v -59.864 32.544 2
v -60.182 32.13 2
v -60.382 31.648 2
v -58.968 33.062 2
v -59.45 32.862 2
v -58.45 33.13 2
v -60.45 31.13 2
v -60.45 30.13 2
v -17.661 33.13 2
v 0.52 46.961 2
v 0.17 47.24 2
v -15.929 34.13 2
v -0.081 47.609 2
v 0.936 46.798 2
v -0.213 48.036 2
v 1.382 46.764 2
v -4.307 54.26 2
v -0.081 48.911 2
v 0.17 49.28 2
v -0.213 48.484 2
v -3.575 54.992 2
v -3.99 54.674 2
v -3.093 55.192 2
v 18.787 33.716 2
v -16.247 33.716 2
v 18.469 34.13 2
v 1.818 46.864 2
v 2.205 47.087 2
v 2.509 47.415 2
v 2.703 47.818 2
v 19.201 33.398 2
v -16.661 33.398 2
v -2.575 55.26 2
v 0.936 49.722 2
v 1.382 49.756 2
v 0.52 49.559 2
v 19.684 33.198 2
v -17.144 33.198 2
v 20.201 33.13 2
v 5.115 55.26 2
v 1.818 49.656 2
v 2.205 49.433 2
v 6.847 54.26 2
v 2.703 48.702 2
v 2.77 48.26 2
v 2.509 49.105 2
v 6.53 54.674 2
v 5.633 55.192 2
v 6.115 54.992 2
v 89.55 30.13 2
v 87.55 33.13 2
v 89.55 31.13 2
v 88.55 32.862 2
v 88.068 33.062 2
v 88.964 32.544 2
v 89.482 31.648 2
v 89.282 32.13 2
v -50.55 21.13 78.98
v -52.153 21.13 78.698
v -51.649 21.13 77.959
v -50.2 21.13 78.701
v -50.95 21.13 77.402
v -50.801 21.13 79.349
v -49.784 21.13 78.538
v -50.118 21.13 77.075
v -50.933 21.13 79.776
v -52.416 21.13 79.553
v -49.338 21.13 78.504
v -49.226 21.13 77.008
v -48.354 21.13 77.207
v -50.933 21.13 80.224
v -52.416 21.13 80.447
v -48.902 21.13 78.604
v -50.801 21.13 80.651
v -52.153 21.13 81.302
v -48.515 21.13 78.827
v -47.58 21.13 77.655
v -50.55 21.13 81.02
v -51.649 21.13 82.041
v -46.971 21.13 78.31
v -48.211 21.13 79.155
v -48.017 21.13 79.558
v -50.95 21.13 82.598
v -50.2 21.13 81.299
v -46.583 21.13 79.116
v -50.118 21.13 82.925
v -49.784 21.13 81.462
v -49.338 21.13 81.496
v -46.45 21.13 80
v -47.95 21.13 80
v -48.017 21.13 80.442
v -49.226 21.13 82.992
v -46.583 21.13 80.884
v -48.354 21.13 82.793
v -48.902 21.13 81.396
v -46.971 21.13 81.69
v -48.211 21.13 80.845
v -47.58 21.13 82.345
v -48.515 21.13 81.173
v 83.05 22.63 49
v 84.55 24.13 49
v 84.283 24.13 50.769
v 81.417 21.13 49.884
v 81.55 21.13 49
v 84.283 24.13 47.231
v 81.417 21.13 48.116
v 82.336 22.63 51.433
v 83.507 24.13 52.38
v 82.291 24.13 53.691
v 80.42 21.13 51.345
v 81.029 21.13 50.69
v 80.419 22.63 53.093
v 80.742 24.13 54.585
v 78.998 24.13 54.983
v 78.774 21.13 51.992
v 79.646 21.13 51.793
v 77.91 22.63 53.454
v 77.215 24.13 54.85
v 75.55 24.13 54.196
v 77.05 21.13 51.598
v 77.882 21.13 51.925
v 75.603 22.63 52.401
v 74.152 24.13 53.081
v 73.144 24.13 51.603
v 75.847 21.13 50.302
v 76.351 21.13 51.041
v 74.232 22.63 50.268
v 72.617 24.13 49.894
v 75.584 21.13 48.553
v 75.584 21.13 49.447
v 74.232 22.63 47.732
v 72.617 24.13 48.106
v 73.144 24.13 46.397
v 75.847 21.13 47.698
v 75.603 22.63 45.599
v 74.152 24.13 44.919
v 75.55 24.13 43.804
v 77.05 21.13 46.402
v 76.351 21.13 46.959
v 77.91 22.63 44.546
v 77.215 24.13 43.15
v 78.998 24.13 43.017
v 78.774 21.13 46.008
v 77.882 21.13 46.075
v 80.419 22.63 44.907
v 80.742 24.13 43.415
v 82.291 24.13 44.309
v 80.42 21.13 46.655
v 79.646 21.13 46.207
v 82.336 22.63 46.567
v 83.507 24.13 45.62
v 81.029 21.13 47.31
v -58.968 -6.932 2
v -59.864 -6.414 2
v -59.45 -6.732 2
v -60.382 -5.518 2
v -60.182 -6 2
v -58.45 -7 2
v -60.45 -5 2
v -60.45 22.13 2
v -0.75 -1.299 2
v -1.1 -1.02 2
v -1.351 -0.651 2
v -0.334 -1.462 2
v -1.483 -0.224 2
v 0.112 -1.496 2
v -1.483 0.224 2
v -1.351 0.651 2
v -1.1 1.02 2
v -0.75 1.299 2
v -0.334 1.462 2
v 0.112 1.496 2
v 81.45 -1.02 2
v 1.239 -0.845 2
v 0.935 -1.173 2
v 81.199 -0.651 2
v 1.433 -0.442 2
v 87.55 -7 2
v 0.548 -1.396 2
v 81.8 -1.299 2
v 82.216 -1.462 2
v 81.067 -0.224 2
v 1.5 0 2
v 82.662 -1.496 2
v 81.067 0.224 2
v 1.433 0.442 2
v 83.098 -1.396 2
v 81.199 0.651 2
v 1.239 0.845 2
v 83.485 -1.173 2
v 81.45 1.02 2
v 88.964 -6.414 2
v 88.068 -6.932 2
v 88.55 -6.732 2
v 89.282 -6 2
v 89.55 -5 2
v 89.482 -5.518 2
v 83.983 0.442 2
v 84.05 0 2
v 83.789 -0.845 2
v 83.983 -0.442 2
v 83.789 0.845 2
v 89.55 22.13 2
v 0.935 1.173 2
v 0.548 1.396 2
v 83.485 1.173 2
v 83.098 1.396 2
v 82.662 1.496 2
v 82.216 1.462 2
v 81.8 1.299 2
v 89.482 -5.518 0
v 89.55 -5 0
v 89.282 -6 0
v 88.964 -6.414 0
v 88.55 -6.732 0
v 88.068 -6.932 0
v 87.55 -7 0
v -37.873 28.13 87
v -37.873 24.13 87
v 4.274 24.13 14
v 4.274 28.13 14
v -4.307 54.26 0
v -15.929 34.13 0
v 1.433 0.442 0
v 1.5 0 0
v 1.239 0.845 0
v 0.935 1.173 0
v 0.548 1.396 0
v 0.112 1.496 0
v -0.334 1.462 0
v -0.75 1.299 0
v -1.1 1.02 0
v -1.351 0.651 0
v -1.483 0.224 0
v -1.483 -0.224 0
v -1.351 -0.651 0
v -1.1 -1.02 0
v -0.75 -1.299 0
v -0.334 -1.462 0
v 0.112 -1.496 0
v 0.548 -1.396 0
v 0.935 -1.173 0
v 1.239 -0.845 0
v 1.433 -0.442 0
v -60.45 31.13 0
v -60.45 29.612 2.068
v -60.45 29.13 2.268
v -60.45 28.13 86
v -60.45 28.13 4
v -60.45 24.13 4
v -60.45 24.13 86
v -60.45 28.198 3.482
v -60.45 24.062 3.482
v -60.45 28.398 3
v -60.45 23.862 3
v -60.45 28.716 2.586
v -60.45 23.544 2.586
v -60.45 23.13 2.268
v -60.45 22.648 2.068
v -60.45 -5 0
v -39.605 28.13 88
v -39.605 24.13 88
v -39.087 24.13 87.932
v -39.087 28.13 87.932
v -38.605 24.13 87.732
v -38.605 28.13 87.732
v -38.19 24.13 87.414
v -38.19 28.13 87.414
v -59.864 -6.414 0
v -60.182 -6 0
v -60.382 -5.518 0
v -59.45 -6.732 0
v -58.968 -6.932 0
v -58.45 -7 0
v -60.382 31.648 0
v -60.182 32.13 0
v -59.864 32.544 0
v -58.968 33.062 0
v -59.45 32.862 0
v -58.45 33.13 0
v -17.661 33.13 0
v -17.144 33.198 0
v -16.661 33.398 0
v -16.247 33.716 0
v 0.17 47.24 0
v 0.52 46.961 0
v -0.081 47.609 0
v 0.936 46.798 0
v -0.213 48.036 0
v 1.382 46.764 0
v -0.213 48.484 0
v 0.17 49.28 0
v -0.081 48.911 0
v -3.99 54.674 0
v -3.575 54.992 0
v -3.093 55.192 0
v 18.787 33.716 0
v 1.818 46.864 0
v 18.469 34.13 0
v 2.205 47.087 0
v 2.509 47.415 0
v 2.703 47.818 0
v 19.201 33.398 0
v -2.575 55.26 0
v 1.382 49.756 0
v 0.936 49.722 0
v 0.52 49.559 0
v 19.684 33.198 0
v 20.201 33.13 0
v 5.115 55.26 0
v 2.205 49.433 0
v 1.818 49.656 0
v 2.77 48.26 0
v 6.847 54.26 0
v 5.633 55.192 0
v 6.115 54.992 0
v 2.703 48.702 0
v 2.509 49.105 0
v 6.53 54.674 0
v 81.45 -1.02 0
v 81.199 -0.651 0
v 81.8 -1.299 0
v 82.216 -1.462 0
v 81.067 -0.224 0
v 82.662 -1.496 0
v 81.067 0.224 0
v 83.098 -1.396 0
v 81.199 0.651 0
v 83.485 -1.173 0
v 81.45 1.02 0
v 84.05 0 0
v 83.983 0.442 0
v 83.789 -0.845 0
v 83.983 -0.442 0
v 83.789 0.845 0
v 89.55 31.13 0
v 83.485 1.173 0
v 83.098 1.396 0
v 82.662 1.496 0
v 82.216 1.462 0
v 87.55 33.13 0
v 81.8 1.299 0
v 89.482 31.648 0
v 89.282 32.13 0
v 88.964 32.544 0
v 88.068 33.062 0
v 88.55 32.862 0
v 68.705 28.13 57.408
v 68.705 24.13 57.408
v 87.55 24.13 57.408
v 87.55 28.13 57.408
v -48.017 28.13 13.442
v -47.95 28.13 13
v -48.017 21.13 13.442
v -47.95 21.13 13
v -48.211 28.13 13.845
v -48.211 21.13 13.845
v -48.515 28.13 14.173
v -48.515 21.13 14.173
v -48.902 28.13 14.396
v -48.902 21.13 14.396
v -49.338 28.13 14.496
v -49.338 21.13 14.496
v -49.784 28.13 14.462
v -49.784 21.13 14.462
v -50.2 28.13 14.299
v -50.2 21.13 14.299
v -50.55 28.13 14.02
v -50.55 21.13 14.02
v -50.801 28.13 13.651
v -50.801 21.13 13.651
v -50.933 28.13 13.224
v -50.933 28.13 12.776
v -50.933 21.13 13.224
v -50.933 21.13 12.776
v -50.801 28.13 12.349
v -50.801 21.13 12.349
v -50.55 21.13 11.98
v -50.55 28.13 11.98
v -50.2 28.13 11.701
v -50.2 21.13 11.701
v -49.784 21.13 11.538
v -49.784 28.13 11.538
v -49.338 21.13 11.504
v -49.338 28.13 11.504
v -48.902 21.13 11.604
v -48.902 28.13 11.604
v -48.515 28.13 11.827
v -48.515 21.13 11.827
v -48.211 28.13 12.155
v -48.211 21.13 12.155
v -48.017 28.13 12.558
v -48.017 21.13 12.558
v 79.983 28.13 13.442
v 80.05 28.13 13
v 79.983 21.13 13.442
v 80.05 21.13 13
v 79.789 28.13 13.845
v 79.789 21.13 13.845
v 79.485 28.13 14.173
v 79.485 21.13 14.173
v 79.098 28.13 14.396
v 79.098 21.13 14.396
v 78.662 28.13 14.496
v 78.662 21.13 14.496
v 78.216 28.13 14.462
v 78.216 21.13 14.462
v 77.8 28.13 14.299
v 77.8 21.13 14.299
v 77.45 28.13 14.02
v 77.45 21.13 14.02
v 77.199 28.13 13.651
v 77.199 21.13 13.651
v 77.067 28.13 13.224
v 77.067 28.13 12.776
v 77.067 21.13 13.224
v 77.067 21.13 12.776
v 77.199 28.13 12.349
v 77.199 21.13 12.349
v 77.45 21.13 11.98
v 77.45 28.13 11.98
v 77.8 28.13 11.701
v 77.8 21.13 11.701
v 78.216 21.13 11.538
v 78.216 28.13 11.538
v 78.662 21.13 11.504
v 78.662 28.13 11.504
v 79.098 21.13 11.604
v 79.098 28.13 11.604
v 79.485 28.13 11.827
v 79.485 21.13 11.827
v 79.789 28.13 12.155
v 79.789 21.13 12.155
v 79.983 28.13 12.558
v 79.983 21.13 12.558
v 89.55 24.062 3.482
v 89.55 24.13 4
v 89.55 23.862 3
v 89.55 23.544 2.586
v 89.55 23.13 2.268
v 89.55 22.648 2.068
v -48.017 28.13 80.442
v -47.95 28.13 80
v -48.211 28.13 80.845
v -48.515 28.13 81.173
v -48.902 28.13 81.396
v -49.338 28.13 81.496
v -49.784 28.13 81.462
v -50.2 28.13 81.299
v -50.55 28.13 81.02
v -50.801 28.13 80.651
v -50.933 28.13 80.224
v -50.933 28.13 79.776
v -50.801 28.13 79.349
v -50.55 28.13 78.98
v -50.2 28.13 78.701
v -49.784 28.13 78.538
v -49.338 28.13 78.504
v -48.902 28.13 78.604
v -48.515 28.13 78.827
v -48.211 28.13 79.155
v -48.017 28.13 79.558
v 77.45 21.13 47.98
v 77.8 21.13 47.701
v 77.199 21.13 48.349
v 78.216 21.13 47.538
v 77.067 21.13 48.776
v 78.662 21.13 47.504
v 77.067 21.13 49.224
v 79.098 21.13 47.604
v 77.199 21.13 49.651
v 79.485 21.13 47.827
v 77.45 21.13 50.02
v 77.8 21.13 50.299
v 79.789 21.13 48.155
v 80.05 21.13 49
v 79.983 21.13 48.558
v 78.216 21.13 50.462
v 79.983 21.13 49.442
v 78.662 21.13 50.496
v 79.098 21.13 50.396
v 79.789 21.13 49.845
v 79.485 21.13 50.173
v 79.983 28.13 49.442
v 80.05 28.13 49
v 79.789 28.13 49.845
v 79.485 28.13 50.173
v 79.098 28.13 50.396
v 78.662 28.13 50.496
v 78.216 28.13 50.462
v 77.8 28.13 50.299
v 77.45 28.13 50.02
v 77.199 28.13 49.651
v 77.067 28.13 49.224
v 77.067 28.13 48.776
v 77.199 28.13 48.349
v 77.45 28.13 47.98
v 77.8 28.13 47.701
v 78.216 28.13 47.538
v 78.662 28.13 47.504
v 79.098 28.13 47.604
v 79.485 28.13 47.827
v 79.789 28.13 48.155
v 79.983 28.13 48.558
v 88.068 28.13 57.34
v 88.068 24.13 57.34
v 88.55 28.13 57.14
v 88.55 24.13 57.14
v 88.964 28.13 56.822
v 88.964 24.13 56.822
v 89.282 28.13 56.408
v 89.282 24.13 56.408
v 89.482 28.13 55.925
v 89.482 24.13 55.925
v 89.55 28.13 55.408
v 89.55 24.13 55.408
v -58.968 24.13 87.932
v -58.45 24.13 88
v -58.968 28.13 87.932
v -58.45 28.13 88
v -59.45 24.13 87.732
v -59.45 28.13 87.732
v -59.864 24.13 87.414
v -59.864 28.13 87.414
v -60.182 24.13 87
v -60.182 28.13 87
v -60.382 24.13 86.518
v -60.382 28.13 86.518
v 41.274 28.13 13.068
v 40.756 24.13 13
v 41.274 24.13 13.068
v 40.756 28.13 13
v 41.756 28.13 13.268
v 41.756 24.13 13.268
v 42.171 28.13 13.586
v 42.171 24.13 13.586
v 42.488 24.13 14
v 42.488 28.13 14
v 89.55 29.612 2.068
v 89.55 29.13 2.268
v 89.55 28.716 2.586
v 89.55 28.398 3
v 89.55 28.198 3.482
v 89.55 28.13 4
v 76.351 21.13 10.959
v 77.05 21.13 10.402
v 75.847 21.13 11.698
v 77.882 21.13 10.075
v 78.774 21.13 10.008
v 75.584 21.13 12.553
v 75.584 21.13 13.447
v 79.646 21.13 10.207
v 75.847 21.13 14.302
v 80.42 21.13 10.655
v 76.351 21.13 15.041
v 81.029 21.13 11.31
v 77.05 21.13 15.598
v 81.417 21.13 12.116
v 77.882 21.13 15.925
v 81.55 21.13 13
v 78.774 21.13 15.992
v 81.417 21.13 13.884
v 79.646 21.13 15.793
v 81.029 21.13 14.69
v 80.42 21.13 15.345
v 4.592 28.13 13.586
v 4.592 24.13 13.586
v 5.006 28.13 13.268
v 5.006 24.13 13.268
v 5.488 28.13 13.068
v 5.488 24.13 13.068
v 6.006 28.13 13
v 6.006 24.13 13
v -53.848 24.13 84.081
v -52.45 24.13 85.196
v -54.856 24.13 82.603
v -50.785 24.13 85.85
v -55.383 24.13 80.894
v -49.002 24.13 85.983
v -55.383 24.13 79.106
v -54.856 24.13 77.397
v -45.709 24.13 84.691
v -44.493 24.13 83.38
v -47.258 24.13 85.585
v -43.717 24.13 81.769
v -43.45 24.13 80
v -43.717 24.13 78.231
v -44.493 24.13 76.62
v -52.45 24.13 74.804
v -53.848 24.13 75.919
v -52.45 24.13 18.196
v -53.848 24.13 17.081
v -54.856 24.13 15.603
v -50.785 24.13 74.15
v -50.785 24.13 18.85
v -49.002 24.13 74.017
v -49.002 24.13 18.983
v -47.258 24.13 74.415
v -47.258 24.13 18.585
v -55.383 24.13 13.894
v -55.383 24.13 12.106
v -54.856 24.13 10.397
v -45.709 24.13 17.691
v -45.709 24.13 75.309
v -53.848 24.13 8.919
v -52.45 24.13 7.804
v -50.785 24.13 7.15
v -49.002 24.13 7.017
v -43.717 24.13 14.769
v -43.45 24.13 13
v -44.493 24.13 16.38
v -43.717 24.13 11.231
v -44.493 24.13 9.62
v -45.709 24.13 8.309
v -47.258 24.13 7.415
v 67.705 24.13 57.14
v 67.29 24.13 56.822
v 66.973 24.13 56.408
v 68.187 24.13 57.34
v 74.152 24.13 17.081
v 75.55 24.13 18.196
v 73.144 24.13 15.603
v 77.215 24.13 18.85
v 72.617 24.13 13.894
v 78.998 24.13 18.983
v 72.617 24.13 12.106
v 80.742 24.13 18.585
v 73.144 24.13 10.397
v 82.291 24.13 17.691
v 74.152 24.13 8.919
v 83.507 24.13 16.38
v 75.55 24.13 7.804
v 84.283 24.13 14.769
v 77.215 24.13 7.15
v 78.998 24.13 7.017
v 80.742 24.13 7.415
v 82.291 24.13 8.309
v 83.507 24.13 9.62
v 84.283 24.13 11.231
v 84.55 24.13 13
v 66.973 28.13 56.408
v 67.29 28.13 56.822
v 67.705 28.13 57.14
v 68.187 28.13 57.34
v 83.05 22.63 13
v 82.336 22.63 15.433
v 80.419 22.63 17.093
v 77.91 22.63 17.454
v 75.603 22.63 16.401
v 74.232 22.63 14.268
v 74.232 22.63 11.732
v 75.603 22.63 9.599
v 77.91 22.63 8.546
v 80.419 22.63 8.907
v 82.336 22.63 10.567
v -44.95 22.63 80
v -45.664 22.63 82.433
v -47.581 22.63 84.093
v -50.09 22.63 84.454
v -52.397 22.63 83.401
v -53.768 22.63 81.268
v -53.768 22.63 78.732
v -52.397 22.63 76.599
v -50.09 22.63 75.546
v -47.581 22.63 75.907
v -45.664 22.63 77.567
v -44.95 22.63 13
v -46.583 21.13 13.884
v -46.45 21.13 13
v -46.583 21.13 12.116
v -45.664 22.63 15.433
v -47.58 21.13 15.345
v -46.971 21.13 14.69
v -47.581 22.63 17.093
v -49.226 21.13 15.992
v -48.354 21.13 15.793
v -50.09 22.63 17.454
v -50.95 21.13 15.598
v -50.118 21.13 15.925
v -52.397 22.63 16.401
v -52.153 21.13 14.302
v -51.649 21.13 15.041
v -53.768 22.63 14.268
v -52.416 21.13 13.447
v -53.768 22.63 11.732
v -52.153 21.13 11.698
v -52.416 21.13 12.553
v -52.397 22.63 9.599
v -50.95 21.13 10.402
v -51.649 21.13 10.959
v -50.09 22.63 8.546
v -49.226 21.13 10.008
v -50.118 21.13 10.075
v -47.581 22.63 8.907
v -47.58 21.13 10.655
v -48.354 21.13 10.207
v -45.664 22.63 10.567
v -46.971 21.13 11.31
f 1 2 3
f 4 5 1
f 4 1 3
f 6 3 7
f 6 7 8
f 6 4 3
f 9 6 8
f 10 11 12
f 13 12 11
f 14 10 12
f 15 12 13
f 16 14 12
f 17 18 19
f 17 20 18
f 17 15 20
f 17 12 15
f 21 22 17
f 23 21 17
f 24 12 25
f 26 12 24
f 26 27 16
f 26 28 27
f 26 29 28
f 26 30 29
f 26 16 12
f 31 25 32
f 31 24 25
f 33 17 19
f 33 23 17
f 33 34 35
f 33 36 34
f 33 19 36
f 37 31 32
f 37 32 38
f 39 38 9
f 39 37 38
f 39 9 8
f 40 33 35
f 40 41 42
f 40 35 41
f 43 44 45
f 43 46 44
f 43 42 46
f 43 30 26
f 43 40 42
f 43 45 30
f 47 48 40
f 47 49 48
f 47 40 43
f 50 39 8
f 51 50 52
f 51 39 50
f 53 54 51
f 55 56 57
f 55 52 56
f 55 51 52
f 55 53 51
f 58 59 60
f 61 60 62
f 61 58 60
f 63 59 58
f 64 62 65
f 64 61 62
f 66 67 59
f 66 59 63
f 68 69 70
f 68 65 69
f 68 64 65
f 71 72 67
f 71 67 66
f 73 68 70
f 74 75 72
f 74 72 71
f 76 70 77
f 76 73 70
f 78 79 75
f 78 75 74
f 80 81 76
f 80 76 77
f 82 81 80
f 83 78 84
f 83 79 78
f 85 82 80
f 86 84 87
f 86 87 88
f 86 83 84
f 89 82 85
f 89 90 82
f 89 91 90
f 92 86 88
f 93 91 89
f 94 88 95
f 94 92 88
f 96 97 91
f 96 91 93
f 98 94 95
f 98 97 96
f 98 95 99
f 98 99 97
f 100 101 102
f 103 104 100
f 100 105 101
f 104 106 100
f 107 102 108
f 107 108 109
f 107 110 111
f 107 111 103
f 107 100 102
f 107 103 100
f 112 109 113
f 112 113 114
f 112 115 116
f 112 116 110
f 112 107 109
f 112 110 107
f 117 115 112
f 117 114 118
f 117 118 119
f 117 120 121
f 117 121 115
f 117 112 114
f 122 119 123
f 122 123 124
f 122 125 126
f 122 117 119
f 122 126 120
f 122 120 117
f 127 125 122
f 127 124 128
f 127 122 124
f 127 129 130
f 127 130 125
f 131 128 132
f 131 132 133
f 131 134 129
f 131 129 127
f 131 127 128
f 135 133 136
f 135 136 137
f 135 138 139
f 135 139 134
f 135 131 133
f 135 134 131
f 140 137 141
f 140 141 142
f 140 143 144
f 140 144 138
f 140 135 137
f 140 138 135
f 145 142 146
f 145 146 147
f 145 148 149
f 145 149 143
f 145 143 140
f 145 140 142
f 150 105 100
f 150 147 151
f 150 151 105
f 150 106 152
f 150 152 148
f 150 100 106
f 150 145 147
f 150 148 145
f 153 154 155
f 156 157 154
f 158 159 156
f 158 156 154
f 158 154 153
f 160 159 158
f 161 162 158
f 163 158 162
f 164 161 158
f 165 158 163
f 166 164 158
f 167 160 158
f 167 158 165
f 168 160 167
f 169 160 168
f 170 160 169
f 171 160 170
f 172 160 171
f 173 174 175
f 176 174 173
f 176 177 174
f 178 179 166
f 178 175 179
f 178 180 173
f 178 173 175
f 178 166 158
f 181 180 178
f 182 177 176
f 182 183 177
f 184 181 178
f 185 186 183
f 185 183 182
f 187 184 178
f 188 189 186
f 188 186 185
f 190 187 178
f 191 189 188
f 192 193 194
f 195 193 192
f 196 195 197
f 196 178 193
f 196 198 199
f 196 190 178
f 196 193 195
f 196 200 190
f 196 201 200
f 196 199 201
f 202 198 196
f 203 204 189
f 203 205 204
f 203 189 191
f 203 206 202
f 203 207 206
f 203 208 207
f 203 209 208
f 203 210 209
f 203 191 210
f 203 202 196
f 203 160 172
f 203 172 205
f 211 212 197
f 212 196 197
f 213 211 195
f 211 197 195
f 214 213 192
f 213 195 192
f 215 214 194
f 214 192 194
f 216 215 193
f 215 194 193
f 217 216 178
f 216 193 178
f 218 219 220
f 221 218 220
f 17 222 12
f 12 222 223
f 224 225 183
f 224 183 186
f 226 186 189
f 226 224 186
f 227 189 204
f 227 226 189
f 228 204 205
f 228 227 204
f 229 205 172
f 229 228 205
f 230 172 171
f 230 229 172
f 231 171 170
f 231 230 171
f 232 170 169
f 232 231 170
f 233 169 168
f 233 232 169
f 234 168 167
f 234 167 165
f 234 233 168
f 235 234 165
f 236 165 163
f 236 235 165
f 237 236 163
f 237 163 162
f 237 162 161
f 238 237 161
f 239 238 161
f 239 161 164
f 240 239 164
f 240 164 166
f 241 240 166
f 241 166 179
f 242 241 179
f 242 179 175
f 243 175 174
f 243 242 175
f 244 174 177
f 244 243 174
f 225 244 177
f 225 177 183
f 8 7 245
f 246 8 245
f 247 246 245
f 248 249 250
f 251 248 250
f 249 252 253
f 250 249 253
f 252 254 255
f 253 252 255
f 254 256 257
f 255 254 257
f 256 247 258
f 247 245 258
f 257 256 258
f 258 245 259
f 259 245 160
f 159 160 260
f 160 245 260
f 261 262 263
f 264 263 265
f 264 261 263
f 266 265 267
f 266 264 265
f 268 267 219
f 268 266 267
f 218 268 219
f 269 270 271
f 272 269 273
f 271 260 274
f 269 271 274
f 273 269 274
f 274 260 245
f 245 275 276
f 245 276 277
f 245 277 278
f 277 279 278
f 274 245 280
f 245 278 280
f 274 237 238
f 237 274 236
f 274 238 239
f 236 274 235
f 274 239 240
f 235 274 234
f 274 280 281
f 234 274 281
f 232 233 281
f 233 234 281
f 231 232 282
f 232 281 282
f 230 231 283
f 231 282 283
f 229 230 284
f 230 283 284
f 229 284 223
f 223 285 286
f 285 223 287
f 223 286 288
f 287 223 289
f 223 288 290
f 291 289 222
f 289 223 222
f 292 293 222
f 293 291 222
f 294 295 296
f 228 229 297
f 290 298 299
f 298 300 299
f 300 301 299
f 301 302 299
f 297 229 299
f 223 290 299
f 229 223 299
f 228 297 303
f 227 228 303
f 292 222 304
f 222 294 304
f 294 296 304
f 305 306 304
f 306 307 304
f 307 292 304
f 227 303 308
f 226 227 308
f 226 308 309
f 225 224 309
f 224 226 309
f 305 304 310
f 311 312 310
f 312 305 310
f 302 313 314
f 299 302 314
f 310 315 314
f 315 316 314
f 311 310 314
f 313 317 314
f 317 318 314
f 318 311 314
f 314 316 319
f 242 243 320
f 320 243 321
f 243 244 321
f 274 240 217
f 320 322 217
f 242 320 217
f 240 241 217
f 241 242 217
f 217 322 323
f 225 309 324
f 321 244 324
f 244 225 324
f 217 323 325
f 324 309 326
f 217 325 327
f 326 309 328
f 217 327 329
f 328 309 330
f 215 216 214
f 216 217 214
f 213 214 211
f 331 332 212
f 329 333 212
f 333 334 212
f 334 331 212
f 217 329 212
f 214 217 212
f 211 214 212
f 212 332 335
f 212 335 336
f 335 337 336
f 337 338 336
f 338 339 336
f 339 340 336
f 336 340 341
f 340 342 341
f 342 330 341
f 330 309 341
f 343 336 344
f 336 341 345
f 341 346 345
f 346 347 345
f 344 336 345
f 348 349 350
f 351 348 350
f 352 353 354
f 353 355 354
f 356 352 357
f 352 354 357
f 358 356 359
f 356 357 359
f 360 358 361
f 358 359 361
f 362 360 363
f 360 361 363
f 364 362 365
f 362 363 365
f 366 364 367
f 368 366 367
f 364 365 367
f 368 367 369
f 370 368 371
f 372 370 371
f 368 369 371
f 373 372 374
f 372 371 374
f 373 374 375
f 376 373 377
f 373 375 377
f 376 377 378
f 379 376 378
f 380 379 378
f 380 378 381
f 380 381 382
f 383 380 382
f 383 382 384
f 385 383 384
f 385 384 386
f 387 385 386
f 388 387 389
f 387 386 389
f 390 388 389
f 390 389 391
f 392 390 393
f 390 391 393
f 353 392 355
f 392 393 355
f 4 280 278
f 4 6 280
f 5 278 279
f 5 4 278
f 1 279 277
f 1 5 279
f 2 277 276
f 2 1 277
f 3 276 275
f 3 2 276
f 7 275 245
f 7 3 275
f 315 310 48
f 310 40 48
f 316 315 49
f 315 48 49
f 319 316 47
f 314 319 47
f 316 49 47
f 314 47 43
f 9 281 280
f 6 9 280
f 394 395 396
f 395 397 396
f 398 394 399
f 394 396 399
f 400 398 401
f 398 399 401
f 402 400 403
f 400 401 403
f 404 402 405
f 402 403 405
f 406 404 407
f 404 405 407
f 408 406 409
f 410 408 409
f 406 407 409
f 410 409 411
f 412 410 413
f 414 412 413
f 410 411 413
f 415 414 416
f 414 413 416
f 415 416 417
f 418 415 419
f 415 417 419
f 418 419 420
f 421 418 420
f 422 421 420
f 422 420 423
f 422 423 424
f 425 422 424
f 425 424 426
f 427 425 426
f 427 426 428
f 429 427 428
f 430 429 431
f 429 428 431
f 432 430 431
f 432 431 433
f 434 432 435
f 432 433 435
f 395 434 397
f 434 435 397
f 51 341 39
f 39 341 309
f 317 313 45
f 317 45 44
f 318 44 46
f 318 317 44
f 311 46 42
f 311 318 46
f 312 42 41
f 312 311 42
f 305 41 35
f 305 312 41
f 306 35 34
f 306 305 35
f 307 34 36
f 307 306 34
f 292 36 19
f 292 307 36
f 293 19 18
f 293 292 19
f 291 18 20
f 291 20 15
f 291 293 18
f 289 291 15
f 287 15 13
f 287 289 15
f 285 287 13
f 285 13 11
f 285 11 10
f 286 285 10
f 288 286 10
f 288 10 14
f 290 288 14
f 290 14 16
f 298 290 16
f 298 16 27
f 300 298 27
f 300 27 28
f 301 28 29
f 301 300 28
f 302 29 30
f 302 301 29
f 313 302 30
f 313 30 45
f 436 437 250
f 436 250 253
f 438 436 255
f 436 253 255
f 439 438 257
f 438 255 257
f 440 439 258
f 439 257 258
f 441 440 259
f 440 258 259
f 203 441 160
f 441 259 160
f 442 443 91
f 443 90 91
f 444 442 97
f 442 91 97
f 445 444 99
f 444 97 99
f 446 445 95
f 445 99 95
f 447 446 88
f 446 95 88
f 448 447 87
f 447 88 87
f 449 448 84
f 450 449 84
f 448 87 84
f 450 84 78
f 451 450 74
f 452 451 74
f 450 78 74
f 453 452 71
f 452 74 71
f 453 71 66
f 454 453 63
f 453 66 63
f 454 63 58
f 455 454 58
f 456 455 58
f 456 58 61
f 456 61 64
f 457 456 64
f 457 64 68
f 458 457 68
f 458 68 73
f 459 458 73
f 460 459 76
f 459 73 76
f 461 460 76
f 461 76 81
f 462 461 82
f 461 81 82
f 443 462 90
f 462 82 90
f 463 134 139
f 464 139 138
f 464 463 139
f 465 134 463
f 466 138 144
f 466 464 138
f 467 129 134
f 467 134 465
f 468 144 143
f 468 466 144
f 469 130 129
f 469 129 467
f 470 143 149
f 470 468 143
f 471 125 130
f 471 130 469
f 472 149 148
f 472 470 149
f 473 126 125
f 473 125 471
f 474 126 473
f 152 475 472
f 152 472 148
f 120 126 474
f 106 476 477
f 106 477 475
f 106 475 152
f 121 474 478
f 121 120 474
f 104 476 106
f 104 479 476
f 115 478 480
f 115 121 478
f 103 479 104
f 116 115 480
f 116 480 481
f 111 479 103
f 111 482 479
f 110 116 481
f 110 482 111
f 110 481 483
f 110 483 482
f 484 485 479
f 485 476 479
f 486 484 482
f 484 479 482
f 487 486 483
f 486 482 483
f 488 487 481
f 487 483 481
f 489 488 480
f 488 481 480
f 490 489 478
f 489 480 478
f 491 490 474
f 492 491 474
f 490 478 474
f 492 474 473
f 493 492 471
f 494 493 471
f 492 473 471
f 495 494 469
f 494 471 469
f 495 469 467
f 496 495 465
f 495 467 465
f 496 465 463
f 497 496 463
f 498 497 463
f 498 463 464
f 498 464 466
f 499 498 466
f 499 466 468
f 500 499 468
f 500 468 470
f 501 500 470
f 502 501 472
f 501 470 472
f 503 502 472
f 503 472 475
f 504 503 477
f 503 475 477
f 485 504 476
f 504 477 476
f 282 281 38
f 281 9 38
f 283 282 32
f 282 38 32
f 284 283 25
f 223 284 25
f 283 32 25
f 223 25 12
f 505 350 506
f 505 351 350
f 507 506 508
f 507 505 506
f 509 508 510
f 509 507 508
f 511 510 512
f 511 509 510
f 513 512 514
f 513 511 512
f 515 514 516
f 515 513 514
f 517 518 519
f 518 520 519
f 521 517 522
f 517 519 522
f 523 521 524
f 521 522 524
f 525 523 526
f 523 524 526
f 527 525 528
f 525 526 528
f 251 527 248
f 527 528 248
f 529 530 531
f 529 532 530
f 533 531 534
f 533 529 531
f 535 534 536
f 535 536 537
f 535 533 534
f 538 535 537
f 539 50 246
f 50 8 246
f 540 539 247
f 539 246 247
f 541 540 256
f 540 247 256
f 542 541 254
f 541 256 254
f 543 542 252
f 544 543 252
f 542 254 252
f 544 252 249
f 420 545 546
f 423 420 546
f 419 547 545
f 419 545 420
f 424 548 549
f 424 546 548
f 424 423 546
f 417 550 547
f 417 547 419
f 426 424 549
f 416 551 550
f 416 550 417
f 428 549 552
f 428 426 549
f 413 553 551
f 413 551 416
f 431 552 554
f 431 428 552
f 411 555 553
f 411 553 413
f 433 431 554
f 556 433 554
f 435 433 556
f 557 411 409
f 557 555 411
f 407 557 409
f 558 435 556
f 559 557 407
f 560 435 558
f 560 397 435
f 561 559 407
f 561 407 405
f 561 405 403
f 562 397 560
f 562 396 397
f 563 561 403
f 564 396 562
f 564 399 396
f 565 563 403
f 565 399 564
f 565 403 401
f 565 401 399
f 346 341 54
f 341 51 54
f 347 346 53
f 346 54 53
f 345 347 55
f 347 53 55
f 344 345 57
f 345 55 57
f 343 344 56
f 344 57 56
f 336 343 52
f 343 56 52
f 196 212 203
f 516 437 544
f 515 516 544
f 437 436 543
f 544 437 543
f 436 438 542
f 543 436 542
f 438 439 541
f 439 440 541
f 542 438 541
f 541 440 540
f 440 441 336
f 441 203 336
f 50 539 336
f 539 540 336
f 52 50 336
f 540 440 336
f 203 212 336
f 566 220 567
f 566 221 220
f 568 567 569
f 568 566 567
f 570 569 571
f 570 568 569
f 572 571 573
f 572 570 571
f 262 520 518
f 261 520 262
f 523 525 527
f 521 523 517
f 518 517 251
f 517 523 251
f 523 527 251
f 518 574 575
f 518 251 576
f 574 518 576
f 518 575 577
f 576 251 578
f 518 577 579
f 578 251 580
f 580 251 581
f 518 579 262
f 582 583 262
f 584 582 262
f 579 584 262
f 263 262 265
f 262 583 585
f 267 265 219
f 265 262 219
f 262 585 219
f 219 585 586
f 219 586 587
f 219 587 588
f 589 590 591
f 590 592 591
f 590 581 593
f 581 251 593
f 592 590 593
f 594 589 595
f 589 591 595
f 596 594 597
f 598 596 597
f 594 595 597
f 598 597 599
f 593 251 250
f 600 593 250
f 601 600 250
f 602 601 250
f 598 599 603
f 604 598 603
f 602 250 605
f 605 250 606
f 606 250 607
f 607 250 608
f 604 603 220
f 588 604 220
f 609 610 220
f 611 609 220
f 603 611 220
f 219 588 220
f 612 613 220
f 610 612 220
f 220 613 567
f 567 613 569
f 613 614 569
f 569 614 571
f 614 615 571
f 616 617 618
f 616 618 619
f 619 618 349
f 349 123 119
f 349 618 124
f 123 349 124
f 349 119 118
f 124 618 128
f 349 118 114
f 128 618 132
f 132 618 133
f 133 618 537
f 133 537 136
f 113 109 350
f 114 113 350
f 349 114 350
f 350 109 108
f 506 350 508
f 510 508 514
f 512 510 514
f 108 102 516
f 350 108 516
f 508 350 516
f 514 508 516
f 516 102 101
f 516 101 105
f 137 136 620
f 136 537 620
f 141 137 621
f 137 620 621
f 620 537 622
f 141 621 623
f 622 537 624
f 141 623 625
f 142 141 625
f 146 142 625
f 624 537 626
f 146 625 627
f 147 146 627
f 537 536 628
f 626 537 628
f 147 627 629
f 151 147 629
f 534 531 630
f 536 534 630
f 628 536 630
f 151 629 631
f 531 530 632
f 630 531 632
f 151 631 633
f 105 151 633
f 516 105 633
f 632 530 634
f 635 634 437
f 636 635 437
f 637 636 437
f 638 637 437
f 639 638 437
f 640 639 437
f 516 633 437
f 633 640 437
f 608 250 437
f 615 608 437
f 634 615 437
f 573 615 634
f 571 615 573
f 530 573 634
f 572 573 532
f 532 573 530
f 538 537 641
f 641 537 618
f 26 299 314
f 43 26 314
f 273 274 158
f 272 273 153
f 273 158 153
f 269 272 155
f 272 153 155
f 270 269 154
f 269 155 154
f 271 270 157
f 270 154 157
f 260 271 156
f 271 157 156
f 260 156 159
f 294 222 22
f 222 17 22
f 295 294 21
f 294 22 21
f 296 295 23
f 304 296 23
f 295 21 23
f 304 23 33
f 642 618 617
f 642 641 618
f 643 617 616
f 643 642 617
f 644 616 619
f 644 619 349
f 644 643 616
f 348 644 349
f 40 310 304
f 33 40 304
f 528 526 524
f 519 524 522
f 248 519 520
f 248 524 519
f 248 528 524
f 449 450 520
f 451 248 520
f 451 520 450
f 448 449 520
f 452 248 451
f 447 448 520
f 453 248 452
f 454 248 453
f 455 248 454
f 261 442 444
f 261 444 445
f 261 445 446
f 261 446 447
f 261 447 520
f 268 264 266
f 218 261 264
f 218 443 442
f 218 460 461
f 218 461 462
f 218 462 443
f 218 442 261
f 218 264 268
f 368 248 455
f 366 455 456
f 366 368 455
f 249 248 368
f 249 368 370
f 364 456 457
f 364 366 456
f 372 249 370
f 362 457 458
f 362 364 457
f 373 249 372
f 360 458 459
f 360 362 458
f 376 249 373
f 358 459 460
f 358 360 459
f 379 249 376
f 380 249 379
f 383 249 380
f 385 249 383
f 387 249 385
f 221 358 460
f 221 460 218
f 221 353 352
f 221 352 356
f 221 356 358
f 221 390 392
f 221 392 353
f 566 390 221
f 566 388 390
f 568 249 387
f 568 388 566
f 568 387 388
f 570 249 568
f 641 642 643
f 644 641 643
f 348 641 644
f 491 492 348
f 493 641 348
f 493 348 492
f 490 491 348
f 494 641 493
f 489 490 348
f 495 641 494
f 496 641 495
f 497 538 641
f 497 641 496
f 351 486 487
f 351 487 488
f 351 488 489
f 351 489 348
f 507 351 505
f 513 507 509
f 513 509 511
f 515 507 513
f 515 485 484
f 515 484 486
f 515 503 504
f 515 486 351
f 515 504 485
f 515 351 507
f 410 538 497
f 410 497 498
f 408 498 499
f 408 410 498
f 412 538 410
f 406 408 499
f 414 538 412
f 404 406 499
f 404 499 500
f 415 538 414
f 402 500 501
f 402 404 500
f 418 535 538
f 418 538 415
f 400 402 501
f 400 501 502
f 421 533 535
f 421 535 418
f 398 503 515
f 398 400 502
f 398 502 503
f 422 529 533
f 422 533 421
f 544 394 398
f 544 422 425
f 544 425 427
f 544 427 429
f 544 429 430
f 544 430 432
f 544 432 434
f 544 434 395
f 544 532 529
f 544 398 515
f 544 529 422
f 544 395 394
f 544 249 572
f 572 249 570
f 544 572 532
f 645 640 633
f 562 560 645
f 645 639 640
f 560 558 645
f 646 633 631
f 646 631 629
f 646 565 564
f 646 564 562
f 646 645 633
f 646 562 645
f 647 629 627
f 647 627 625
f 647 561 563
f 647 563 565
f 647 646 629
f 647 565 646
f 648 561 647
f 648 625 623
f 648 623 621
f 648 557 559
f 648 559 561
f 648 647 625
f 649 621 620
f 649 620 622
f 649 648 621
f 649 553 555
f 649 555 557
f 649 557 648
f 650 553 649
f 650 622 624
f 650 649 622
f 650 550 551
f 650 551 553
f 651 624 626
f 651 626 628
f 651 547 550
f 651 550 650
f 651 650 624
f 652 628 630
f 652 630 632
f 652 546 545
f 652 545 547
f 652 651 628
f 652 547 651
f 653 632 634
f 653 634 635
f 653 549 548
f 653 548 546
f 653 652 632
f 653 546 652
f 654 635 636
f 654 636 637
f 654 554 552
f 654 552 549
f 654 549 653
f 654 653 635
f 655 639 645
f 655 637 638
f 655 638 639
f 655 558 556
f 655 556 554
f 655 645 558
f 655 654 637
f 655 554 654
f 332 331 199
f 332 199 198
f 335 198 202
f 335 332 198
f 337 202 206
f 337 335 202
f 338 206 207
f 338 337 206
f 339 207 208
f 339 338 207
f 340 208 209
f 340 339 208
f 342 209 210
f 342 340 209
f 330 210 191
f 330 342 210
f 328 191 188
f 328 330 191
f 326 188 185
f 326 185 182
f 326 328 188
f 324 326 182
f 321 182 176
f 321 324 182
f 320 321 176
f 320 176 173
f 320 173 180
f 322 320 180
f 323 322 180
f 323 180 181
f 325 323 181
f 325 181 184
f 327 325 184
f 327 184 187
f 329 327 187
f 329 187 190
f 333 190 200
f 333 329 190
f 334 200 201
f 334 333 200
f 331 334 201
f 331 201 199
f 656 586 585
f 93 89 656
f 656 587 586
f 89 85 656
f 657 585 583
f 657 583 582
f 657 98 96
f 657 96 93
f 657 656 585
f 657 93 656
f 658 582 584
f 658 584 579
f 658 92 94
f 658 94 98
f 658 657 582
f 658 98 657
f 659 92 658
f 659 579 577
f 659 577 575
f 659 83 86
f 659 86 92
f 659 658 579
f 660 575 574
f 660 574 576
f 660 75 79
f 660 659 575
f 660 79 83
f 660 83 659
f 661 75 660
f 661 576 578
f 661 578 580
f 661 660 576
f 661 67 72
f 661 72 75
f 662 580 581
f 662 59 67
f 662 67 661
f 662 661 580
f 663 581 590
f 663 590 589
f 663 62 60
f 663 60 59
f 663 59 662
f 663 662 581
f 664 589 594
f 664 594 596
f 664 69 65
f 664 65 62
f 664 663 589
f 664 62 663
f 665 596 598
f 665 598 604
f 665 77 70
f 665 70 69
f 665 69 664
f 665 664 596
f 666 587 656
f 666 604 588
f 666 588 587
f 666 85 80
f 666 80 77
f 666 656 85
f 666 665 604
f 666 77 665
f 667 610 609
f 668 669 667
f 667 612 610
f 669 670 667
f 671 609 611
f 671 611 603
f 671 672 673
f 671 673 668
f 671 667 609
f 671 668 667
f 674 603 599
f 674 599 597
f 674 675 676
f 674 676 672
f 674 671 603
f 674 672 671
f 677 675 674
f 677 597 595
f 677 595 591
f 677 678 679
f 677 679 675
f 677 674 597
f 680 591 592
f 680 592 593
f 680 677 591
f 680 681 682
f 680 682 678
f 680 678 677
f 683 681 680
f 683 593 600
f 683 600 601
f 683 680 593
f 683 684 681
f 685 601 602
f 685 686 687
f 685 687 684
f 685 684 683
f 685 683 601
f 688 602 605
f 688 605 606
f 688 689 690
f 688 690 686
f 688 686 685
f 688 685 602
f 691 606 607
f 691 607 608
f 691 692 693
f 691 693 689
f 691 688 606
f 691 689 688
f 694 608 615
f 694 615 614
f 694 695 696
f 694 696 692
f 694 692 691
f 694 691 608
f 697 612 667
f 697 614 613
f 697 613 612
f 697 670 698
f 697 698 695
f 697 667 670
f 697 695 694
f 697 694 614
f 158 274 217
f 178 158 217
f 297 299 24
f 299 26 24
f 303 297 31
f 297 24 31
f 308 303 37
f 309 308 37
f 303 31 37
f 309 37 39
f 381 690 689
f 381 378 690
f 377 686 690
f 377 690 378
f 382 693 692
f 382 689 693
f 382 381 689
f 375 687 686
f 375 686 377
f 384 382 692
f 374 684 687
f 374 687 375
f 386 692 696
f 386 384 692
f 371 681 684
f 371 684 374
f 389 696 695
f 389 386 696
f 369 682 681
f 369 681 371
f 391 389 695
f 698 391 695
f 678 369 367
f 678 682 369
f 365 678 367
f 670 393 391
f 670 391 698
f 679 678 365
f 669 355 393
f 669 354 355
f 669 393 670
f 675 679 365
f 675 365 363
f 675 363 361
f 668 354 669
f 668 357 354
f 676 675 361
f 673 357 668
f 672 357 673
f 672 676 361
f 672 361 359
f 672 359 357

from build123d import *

# Parameters (mm, degrees)
F0_R          = 1.5
F0_W          = 150
F0_H          = 4
F0_H_2        = 31.13
F1_DEPTH      = 2
F2_DEPTH      = 88
F3_R          = 6
F3_R_2        = 1.5
F4_DEPTH      = 3
F4_TAPER      = 45
F5_DEPTH      = 31.131
F5_DEPTH_BACK = 31.131
F6_R          = 2


with BuildPart() as f1:
    # F0 (on Top) → F1 (new body)
    with BuildSketch(Plane.XY):
        Polygon((6.27, 55.26), (-3.73, 55.26), (-16.5067614572, 33.13), (-60.45, 33.13), (-60.45, 28.13), (89.55, 28.13), (89.55, 33.13), (19.0467614572, 33.13), align=None)
        with Locations((1.27, 48.26)):
            Circle(F0_R, mode=Mode.SUBTRACT)
        with Locations((14.55, 26.13)):
            Rectangle(F0_W, F0_H)
        with Locations((14.55, 8.565)):
            Rectangle(F0_W, F0_H_2)
        Circle(F0_R, mode=Mode.SUBTRACT)
        with Locations((82.55, 0)):
            Circle(F0_R, mode=Mode.SUBTRACT)
    extrude(amount=F1_DEPTH)

    # F0 (on Top) → F2 (join)
    with BuildSketch(Plane.XY):
        with Locations((14.55, 26.13)):
            Rectangle(F0_W, F0_H)
    extrude(amount=F2_DEPTH)

    # F3 (on face) → F4 (join)
    with BuildSketch(Plane.XZ.offset(-24.13)):
        with Locations((-49.45, 80)):
            Circle(F3_R)
        with Locations((-49.45, 80)):
            Circle(F3_R_2, mode=Mode.SUBTRACT)
        with Locations((-49.45, 13)):
            Circle(F3_R)
        with Locations((-49.45, 13)):
            Circle(F3_R_2, mode=Mode.SUBTRACT)
        with Locations((78.55, 13)):
            Circle(F3_R)
        with Locations((78.55, 13)):
            Circle(F3_R_2, mode=Mode.SUBTRACT)
        with Locations((78.55, 49)):
            Circle(F3_R)
        with Locations((78.55, 49)):
            Circle(F3_R_2, mode=Mode.SUBTRACT)
        with Locations((-49.45, 80)):
            Circle(F3_R_2)
        with Locations((-49.45, 13)):
            Circle(F3_R_2)
        with Locations((78.55, 13)):
            Circle(F3_R_2)
        with Locations((78.55, 49)):
            Circle(F3_R_2)
    extrude(amount=F4_DEPTH, taper=F4_TAPER)

    # F3 (on face) → F5 (cut, two sides)
    with BuildSketch(Plane.XZ.offset(-24.13)) as f5_sk:
        with Locations((-49.45, 13)):
            Circle(F3_R_2)
        with Locations((78.55, 13)):
            Circle(F3_R_2)
        with Locations((78.55, 49)):
            Circle(F3_R_2)
        with Locations((-49.45, 80)):
            Circle(F3_R_2)
        Polygon((89.55, 88), (-38.45, 88), (4.8512701892, 13), (41.9111145423, 13), (67.55, 57.4078522623), (89.55, 57.4078522623), align=None)
    extrude(amount=F5_DEPTH, mode=Mode.SUBTRACT)
    extrude(f5_sk.sketch, amount=-F5_DEPTH_BACK, mode=Mode.SUBTRACT)

    # F6
    f6_edges = [f1.edges().sort_by_distance(p)[0] for p in [
        (-60.45, 26.13, 88),
        (-38.45, 26.13, 88),
        (4.85127, 26.13, 13),
        (41.911115, 26.13, 13),
        (67.55, 26.13, 57.407852),
        (89.55, 26.13, 57.407852),
        (89.55, -7, 1),
        (89.55, 33.13, 1),
        (19.046761, 33.13, 1),
        (6.27, 55.26, 1),
        (-3.73, 55.26, 1),
        (-16.506761, 33.13, 1),
        (-60.45, 33.13, 1),
        (-60.45, -7, 1),
        (14.55, 24.13, 2),
        (14.55, 28.13, 2),
    ]]
    fillet(f6_edges, radius=F6_R)


solid = f1.part
